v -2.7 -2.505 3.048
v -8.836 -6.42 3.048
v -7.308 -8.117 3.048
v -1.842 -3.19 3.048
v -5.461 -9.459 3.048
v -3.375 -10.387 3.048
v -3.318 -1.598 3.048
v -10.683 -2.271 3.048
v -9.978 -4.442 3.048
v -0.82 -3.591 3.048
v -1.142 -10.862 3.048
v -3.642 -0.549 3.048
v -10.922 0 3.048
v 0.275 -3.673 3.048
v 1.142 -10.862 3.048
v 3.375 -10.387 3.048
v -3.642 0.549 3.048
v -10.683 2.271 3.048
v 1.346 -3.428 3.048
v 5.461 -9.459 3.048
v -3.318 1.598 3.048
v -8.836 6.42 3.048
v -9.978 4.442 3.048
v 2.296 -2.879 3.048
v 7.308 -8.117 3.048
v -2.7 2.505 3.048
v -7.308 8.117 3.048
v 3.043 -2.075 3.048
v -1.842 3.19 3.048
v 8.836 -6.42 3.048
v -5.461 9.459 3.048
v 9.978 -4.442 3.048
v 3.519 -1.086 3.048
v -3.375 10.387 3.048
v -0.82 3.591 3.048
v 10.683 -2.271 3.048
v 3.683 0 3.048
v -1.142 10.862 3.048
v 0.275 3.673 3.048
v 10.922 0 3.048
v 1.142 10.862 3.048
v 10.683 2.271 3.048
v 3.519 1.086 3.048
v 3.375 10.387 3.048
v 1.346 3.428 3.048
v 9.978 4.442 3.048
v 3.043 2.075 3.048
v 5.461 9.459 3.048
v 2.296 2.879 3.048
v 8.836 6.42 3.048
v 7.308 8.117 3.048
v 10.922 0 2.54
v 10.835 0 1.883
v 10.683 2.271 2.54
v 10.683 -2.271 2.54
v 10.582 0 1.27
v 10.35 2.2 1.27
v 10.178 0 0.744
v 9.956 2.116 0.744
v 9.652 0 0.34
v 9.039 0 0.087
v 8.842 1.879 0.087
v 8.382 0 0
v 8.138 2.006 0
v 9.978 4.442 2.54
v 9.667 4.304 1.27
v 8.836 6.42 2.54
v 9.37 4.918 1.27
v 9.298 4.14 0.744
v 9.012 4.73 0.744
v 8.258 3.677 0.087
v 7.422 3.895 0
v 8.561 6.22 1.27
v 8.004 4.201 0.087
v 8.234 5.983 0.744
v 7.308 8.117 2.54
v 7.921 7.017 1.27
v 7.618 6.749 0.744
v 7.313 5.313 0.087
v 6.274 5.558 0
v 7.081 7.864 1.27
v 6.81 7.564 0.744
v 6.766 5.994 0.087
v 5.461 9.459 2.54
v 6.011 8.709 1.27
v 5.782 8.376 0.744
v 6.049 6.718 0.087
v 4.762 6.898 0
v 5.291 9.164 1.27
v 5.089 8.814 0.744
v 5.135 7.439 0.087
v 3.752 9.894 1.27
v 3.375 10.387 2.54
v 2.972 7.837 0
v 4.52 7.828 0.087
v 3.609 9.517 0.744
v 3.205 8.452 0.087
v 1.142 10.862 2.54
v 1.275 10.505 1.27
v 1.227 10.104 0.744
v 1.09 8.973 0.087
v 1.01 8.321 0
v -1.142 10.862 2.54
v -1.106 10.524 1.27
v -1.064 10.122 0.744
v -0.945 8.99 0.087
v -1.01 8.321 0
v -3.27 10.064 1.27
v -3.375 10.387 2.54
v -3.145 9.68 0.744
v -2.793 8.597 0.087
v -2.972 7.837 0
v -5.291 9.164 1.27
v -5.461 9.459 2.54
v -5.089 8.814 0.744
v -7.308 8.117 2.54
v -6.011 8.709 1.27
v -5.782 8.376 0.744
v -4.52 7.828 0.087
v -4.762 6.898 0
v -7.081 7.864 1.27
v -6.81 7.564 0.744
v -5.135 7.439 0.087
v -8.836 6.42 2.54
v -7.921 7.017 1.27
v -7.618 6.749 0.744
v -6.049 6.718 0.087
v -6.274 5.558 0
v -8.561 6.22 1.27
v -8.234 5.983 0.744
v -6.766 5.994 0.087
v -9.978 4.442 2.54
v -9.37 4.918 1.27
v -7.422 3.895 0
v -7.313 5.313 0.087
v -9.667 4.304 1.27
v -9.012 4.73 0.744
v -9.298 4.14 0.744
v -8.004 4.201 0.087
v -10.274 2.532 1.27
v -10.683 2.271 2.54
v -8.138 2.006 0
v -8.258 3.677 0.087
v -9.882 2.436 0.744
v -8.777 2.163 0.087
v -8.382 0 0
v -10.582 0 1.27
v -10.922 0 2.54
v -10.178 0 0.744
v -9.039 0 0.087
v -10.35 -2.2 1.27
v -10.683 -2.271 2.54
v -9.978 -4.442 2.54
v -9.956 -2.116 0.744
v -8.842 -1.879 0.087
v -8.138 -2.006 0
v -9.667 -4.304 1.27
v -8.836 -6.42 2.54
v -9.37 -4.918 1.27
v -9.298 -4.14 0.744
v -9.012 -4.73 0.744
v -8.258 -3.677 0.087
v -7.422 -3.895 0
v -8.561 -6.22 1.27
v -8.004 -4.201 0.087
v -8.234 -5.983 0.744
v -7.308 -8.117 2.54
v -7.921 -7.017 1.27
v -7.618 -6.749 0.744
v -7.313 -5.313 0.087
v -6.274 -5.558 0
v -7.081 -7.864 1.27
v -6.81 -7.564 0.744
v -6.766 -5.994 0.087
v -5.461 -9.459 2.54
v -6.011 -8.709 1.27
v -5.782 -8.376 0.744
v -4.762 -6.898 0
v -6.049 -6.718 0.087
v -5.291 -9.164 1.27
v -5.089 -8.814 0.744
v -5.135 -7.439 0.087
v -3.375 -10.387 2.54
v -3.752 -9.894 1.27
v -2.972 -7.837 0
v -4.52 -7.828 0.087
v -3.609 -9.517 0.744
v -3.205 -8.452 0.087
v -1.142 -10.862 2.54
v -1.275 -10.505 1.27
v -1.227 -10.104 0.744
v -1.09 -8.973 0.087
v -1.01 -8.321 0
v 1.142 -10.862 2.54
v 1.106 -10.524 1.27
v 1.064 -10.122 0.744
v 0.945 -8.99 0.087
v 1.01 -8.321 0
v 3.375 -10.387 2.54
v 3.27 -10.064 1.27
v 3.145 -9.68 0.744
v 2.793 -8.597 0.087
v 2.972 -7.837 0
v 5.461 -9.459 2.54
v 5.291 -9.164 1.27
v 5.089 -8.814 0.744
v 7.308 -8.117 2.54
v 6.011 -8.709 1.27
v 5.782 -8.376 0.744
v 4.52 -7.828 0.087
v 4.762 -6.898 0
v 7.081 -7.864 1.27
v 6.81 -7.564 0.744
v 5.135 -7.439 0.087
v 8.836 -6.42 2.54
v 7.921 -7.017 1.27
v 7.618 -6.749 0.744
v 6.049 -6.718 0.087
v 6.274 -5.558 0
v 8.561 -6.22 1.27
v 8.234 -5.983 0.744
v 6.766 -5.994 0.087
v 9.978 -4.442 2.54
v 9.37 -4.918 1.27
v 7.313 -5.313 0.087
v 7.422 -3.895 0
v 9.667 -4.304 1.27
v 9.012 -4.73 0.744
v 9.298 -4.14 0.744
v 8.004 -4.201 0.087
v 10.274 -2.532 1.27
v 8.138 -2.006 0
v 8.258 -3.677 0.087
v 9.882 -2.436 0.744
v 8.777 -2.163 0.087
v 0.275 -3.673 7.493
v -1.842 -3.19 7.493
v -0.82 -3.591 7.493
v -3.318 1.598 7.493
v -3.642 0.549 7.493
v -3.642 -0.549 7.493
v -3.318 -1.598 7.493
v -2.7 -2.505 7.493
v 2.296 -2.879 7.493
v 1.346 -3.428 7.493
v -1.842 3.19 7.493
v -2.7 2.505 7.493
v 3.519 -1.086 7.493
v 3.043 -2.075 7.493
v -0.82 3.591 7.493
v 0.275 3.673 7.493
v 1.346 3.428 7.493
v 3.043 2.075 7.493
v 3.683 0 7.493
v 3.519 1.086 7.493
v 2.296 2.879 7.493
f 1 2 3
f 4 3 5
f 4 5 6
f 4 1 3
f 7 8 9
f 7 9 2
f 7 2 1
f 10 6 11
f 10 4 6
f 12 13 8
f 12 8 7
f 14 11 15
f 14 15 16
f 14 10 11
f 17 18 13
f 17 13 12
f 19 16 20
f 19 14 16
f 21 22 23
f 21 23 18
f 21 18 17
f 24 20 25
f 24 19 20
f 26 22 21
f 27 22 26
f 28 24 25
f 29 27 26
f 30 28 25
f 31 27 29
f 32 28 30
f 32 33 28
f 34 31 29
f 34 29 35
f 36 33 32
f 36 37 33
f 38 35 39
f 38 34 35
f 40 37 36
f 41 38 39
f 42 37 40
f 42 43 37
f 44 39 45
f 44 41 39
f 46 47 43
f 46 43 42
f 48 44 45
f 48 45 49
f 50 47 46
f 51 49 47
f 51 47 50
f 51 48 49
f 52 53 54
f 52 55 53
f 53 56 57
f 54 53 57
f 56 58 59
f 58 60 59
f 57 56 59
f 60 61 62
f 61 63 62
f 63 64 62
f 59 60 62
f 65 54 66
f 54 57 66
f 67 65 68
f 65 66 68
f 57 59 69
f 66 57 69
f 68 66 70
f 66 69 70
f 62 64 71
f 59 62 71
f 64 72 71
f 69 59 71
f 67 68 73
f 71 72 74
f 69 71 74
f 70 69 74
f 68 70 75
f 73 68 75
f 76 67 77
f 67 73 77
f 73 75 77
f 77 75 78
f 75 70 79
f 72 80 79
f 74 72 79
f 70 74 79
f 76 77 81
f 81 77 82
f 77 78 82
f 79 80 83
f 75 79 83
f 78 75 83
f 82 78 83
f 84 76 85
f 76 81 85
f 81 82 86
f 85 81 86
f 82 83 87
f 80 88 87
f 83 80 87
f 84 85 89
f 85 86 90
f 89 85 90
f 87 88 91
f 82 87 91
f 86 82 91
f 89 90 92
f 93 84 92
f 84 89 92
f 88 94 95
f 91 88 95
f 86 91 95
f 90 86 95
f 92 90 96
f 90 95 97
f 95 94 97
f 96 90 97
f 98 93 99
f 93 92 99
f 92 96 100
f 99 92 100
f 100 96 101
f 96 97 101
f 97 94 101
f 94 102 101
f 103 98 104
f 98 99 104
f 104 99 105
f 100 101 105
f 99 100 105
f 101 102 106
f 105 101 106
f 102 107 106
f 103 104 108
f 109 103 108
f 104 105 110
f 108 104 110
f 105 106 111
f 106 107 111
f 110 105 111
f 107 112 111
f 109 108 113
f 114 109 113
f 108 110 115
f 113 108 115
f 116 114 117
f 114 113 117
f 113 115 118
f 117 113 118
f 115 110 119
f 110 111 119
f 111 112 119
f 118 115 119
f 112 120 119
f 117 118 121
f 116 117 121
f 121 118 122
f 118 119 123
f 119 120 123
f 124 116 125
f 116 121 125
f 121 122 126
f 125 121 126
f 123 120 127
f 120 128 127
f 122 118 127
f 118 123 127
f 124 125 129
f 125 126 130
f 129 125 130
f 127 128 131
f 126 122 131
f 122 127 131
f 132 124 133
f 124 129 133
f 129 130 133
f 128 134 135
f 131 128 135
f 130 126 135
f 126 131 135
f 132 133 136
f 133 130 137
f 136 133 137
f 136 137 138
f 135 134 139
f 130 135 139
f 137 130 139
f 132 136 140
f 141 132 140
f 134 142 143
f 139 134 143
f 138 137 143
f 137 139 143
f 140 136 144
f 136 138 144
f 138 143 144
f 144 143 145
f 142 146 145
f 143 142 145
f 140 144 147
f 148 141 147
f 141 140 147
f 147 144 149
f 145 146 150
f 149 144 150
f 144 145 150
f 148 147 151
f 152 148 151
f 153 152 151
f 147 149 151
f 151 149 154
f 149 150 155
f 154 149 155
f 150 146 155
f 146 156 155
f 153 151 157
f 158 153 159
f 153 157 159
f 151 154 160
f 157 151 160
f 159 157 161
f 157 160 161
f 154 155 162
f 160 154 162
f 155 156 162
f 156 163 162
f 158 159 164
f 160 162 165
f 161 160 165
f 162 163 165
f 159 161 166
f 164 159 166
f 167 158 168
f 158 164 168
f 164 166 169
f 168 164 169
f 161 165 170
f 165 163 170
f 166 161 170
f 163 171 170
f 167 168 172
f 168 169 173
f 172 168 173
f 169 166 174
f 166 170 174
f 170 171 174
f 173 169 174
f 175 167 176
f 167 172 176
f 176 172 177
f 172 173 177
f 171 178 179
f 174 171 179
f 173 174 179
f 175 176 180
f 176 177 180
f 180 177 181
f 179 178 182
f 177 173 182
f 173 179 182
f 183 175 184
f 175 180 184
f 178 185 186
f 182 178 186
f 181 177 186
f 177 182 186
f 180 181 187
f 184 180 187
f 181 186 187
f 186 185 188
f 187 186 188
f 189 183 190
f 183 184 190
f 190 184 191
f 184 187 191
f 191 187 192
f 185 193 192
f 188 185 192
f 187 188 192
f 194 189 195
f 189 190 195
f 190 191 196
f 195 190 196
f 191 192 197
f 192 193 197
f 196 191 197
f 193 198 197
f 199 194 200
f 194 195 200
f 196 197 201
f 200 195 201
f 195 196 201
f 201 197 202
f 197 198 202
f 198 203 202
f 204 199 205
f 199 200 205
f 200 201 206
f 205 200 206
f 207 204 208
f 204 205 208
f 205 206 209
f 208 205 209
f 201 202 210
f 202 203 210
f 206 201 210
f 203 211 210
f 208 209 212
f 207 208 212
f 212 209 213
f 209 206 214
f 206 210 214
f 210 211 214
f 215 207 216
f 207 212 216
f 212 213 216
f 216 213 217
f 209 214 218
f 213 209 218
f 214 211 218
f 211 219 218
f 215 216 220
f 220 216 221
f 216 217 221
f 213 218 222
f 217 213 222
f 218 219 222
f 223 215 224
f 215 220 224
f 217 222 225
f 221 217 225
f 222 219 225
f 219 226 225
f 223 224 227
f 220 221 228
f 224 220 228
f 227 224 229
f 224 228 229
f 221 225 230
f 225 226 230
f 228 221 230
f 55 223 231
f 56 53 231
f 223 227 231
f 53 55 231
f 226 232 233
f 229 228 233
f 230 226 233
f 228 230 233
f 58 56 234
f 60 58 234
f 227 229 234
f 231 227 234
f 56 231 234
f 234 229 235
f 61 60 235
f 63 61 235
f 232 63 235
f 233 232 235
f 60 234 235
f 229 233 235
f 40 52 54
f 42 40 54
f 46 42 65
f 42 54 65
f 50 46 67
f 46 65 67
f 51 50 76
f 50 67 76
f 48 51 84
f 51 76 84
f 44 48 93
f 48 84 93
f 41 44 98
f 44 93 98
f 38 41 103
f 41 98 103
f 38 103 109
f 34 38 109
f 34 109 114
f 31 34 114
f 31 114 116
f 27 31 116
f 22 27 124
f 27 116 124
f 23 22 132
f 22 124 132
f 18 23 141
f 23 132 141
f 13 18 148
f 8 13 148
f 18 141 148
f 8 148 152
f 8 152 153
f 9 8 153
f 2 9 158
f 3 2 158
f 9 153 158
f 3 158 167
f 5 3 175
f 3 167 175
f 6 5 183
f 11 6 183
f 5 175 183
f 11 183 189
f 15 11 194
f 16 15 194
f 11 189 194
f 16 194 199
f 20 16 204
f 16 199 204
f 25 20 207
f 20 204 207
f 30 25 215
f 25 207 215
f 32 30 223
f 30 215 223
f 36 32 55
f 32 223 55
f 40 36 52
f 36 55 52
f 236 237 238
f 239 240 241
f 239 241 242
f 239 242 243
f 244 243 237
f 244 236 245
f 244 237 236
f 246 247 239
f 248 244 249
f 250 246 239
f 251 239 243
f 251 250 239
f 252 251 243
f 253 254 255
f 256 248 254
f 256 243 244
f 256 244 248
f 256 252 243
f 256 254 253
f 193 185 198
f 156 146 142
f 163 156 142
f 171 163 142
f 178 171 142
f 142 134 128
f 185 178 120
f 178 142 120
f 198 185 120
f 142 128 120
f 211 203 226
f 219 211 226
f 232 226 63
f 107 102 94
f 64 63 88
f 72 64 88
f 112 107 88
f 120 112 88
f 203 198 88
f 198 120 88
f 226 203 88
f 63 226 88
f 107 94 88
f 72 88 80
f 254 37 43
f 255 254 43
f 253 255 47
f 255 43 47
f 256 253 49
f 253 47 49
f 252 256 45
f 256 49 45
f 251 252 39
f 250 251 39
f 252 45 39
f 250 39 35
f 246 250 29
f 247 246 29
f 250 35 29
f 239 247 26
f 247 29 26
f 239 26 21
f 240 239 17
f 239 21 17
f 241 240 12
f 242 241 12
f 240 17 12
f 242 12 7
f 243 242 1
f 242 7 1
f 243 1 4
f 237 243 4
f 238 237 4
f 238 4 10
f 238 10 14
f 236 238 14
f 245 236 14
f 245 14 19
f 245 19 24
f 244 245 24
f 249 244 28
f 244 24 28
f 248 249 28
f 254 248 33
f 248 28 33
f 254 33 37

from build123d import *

# Parameters (mm, degrees)
F0_R     = 10.922
F1_DEPTH = 3.048
F2_R     = 2.54
F3_R     = 3.683
F4_DEPTH = 4.445


with BuildPart() as f1:
    # F0 (on Top) → F1 (new body)
    with BuildSketch(Plane.XY):
        Circle(F0_R)
    extrude(amount=F1_DEPTH)

    # F2
    f2_edges = [f1.edges().sort_by_distance(p)[0] for p in [
        (-10.922, 0, 0),
    ]]
    fillet(f2_edges, radius=F2_R)

    # F3 (on face) → F4 (join)
    with BuildSketch(Plane.XY.offset(3.048)):
        Circle(F3_R)
    extrude(amount=F4_DEPTH)


solid = f1.part
